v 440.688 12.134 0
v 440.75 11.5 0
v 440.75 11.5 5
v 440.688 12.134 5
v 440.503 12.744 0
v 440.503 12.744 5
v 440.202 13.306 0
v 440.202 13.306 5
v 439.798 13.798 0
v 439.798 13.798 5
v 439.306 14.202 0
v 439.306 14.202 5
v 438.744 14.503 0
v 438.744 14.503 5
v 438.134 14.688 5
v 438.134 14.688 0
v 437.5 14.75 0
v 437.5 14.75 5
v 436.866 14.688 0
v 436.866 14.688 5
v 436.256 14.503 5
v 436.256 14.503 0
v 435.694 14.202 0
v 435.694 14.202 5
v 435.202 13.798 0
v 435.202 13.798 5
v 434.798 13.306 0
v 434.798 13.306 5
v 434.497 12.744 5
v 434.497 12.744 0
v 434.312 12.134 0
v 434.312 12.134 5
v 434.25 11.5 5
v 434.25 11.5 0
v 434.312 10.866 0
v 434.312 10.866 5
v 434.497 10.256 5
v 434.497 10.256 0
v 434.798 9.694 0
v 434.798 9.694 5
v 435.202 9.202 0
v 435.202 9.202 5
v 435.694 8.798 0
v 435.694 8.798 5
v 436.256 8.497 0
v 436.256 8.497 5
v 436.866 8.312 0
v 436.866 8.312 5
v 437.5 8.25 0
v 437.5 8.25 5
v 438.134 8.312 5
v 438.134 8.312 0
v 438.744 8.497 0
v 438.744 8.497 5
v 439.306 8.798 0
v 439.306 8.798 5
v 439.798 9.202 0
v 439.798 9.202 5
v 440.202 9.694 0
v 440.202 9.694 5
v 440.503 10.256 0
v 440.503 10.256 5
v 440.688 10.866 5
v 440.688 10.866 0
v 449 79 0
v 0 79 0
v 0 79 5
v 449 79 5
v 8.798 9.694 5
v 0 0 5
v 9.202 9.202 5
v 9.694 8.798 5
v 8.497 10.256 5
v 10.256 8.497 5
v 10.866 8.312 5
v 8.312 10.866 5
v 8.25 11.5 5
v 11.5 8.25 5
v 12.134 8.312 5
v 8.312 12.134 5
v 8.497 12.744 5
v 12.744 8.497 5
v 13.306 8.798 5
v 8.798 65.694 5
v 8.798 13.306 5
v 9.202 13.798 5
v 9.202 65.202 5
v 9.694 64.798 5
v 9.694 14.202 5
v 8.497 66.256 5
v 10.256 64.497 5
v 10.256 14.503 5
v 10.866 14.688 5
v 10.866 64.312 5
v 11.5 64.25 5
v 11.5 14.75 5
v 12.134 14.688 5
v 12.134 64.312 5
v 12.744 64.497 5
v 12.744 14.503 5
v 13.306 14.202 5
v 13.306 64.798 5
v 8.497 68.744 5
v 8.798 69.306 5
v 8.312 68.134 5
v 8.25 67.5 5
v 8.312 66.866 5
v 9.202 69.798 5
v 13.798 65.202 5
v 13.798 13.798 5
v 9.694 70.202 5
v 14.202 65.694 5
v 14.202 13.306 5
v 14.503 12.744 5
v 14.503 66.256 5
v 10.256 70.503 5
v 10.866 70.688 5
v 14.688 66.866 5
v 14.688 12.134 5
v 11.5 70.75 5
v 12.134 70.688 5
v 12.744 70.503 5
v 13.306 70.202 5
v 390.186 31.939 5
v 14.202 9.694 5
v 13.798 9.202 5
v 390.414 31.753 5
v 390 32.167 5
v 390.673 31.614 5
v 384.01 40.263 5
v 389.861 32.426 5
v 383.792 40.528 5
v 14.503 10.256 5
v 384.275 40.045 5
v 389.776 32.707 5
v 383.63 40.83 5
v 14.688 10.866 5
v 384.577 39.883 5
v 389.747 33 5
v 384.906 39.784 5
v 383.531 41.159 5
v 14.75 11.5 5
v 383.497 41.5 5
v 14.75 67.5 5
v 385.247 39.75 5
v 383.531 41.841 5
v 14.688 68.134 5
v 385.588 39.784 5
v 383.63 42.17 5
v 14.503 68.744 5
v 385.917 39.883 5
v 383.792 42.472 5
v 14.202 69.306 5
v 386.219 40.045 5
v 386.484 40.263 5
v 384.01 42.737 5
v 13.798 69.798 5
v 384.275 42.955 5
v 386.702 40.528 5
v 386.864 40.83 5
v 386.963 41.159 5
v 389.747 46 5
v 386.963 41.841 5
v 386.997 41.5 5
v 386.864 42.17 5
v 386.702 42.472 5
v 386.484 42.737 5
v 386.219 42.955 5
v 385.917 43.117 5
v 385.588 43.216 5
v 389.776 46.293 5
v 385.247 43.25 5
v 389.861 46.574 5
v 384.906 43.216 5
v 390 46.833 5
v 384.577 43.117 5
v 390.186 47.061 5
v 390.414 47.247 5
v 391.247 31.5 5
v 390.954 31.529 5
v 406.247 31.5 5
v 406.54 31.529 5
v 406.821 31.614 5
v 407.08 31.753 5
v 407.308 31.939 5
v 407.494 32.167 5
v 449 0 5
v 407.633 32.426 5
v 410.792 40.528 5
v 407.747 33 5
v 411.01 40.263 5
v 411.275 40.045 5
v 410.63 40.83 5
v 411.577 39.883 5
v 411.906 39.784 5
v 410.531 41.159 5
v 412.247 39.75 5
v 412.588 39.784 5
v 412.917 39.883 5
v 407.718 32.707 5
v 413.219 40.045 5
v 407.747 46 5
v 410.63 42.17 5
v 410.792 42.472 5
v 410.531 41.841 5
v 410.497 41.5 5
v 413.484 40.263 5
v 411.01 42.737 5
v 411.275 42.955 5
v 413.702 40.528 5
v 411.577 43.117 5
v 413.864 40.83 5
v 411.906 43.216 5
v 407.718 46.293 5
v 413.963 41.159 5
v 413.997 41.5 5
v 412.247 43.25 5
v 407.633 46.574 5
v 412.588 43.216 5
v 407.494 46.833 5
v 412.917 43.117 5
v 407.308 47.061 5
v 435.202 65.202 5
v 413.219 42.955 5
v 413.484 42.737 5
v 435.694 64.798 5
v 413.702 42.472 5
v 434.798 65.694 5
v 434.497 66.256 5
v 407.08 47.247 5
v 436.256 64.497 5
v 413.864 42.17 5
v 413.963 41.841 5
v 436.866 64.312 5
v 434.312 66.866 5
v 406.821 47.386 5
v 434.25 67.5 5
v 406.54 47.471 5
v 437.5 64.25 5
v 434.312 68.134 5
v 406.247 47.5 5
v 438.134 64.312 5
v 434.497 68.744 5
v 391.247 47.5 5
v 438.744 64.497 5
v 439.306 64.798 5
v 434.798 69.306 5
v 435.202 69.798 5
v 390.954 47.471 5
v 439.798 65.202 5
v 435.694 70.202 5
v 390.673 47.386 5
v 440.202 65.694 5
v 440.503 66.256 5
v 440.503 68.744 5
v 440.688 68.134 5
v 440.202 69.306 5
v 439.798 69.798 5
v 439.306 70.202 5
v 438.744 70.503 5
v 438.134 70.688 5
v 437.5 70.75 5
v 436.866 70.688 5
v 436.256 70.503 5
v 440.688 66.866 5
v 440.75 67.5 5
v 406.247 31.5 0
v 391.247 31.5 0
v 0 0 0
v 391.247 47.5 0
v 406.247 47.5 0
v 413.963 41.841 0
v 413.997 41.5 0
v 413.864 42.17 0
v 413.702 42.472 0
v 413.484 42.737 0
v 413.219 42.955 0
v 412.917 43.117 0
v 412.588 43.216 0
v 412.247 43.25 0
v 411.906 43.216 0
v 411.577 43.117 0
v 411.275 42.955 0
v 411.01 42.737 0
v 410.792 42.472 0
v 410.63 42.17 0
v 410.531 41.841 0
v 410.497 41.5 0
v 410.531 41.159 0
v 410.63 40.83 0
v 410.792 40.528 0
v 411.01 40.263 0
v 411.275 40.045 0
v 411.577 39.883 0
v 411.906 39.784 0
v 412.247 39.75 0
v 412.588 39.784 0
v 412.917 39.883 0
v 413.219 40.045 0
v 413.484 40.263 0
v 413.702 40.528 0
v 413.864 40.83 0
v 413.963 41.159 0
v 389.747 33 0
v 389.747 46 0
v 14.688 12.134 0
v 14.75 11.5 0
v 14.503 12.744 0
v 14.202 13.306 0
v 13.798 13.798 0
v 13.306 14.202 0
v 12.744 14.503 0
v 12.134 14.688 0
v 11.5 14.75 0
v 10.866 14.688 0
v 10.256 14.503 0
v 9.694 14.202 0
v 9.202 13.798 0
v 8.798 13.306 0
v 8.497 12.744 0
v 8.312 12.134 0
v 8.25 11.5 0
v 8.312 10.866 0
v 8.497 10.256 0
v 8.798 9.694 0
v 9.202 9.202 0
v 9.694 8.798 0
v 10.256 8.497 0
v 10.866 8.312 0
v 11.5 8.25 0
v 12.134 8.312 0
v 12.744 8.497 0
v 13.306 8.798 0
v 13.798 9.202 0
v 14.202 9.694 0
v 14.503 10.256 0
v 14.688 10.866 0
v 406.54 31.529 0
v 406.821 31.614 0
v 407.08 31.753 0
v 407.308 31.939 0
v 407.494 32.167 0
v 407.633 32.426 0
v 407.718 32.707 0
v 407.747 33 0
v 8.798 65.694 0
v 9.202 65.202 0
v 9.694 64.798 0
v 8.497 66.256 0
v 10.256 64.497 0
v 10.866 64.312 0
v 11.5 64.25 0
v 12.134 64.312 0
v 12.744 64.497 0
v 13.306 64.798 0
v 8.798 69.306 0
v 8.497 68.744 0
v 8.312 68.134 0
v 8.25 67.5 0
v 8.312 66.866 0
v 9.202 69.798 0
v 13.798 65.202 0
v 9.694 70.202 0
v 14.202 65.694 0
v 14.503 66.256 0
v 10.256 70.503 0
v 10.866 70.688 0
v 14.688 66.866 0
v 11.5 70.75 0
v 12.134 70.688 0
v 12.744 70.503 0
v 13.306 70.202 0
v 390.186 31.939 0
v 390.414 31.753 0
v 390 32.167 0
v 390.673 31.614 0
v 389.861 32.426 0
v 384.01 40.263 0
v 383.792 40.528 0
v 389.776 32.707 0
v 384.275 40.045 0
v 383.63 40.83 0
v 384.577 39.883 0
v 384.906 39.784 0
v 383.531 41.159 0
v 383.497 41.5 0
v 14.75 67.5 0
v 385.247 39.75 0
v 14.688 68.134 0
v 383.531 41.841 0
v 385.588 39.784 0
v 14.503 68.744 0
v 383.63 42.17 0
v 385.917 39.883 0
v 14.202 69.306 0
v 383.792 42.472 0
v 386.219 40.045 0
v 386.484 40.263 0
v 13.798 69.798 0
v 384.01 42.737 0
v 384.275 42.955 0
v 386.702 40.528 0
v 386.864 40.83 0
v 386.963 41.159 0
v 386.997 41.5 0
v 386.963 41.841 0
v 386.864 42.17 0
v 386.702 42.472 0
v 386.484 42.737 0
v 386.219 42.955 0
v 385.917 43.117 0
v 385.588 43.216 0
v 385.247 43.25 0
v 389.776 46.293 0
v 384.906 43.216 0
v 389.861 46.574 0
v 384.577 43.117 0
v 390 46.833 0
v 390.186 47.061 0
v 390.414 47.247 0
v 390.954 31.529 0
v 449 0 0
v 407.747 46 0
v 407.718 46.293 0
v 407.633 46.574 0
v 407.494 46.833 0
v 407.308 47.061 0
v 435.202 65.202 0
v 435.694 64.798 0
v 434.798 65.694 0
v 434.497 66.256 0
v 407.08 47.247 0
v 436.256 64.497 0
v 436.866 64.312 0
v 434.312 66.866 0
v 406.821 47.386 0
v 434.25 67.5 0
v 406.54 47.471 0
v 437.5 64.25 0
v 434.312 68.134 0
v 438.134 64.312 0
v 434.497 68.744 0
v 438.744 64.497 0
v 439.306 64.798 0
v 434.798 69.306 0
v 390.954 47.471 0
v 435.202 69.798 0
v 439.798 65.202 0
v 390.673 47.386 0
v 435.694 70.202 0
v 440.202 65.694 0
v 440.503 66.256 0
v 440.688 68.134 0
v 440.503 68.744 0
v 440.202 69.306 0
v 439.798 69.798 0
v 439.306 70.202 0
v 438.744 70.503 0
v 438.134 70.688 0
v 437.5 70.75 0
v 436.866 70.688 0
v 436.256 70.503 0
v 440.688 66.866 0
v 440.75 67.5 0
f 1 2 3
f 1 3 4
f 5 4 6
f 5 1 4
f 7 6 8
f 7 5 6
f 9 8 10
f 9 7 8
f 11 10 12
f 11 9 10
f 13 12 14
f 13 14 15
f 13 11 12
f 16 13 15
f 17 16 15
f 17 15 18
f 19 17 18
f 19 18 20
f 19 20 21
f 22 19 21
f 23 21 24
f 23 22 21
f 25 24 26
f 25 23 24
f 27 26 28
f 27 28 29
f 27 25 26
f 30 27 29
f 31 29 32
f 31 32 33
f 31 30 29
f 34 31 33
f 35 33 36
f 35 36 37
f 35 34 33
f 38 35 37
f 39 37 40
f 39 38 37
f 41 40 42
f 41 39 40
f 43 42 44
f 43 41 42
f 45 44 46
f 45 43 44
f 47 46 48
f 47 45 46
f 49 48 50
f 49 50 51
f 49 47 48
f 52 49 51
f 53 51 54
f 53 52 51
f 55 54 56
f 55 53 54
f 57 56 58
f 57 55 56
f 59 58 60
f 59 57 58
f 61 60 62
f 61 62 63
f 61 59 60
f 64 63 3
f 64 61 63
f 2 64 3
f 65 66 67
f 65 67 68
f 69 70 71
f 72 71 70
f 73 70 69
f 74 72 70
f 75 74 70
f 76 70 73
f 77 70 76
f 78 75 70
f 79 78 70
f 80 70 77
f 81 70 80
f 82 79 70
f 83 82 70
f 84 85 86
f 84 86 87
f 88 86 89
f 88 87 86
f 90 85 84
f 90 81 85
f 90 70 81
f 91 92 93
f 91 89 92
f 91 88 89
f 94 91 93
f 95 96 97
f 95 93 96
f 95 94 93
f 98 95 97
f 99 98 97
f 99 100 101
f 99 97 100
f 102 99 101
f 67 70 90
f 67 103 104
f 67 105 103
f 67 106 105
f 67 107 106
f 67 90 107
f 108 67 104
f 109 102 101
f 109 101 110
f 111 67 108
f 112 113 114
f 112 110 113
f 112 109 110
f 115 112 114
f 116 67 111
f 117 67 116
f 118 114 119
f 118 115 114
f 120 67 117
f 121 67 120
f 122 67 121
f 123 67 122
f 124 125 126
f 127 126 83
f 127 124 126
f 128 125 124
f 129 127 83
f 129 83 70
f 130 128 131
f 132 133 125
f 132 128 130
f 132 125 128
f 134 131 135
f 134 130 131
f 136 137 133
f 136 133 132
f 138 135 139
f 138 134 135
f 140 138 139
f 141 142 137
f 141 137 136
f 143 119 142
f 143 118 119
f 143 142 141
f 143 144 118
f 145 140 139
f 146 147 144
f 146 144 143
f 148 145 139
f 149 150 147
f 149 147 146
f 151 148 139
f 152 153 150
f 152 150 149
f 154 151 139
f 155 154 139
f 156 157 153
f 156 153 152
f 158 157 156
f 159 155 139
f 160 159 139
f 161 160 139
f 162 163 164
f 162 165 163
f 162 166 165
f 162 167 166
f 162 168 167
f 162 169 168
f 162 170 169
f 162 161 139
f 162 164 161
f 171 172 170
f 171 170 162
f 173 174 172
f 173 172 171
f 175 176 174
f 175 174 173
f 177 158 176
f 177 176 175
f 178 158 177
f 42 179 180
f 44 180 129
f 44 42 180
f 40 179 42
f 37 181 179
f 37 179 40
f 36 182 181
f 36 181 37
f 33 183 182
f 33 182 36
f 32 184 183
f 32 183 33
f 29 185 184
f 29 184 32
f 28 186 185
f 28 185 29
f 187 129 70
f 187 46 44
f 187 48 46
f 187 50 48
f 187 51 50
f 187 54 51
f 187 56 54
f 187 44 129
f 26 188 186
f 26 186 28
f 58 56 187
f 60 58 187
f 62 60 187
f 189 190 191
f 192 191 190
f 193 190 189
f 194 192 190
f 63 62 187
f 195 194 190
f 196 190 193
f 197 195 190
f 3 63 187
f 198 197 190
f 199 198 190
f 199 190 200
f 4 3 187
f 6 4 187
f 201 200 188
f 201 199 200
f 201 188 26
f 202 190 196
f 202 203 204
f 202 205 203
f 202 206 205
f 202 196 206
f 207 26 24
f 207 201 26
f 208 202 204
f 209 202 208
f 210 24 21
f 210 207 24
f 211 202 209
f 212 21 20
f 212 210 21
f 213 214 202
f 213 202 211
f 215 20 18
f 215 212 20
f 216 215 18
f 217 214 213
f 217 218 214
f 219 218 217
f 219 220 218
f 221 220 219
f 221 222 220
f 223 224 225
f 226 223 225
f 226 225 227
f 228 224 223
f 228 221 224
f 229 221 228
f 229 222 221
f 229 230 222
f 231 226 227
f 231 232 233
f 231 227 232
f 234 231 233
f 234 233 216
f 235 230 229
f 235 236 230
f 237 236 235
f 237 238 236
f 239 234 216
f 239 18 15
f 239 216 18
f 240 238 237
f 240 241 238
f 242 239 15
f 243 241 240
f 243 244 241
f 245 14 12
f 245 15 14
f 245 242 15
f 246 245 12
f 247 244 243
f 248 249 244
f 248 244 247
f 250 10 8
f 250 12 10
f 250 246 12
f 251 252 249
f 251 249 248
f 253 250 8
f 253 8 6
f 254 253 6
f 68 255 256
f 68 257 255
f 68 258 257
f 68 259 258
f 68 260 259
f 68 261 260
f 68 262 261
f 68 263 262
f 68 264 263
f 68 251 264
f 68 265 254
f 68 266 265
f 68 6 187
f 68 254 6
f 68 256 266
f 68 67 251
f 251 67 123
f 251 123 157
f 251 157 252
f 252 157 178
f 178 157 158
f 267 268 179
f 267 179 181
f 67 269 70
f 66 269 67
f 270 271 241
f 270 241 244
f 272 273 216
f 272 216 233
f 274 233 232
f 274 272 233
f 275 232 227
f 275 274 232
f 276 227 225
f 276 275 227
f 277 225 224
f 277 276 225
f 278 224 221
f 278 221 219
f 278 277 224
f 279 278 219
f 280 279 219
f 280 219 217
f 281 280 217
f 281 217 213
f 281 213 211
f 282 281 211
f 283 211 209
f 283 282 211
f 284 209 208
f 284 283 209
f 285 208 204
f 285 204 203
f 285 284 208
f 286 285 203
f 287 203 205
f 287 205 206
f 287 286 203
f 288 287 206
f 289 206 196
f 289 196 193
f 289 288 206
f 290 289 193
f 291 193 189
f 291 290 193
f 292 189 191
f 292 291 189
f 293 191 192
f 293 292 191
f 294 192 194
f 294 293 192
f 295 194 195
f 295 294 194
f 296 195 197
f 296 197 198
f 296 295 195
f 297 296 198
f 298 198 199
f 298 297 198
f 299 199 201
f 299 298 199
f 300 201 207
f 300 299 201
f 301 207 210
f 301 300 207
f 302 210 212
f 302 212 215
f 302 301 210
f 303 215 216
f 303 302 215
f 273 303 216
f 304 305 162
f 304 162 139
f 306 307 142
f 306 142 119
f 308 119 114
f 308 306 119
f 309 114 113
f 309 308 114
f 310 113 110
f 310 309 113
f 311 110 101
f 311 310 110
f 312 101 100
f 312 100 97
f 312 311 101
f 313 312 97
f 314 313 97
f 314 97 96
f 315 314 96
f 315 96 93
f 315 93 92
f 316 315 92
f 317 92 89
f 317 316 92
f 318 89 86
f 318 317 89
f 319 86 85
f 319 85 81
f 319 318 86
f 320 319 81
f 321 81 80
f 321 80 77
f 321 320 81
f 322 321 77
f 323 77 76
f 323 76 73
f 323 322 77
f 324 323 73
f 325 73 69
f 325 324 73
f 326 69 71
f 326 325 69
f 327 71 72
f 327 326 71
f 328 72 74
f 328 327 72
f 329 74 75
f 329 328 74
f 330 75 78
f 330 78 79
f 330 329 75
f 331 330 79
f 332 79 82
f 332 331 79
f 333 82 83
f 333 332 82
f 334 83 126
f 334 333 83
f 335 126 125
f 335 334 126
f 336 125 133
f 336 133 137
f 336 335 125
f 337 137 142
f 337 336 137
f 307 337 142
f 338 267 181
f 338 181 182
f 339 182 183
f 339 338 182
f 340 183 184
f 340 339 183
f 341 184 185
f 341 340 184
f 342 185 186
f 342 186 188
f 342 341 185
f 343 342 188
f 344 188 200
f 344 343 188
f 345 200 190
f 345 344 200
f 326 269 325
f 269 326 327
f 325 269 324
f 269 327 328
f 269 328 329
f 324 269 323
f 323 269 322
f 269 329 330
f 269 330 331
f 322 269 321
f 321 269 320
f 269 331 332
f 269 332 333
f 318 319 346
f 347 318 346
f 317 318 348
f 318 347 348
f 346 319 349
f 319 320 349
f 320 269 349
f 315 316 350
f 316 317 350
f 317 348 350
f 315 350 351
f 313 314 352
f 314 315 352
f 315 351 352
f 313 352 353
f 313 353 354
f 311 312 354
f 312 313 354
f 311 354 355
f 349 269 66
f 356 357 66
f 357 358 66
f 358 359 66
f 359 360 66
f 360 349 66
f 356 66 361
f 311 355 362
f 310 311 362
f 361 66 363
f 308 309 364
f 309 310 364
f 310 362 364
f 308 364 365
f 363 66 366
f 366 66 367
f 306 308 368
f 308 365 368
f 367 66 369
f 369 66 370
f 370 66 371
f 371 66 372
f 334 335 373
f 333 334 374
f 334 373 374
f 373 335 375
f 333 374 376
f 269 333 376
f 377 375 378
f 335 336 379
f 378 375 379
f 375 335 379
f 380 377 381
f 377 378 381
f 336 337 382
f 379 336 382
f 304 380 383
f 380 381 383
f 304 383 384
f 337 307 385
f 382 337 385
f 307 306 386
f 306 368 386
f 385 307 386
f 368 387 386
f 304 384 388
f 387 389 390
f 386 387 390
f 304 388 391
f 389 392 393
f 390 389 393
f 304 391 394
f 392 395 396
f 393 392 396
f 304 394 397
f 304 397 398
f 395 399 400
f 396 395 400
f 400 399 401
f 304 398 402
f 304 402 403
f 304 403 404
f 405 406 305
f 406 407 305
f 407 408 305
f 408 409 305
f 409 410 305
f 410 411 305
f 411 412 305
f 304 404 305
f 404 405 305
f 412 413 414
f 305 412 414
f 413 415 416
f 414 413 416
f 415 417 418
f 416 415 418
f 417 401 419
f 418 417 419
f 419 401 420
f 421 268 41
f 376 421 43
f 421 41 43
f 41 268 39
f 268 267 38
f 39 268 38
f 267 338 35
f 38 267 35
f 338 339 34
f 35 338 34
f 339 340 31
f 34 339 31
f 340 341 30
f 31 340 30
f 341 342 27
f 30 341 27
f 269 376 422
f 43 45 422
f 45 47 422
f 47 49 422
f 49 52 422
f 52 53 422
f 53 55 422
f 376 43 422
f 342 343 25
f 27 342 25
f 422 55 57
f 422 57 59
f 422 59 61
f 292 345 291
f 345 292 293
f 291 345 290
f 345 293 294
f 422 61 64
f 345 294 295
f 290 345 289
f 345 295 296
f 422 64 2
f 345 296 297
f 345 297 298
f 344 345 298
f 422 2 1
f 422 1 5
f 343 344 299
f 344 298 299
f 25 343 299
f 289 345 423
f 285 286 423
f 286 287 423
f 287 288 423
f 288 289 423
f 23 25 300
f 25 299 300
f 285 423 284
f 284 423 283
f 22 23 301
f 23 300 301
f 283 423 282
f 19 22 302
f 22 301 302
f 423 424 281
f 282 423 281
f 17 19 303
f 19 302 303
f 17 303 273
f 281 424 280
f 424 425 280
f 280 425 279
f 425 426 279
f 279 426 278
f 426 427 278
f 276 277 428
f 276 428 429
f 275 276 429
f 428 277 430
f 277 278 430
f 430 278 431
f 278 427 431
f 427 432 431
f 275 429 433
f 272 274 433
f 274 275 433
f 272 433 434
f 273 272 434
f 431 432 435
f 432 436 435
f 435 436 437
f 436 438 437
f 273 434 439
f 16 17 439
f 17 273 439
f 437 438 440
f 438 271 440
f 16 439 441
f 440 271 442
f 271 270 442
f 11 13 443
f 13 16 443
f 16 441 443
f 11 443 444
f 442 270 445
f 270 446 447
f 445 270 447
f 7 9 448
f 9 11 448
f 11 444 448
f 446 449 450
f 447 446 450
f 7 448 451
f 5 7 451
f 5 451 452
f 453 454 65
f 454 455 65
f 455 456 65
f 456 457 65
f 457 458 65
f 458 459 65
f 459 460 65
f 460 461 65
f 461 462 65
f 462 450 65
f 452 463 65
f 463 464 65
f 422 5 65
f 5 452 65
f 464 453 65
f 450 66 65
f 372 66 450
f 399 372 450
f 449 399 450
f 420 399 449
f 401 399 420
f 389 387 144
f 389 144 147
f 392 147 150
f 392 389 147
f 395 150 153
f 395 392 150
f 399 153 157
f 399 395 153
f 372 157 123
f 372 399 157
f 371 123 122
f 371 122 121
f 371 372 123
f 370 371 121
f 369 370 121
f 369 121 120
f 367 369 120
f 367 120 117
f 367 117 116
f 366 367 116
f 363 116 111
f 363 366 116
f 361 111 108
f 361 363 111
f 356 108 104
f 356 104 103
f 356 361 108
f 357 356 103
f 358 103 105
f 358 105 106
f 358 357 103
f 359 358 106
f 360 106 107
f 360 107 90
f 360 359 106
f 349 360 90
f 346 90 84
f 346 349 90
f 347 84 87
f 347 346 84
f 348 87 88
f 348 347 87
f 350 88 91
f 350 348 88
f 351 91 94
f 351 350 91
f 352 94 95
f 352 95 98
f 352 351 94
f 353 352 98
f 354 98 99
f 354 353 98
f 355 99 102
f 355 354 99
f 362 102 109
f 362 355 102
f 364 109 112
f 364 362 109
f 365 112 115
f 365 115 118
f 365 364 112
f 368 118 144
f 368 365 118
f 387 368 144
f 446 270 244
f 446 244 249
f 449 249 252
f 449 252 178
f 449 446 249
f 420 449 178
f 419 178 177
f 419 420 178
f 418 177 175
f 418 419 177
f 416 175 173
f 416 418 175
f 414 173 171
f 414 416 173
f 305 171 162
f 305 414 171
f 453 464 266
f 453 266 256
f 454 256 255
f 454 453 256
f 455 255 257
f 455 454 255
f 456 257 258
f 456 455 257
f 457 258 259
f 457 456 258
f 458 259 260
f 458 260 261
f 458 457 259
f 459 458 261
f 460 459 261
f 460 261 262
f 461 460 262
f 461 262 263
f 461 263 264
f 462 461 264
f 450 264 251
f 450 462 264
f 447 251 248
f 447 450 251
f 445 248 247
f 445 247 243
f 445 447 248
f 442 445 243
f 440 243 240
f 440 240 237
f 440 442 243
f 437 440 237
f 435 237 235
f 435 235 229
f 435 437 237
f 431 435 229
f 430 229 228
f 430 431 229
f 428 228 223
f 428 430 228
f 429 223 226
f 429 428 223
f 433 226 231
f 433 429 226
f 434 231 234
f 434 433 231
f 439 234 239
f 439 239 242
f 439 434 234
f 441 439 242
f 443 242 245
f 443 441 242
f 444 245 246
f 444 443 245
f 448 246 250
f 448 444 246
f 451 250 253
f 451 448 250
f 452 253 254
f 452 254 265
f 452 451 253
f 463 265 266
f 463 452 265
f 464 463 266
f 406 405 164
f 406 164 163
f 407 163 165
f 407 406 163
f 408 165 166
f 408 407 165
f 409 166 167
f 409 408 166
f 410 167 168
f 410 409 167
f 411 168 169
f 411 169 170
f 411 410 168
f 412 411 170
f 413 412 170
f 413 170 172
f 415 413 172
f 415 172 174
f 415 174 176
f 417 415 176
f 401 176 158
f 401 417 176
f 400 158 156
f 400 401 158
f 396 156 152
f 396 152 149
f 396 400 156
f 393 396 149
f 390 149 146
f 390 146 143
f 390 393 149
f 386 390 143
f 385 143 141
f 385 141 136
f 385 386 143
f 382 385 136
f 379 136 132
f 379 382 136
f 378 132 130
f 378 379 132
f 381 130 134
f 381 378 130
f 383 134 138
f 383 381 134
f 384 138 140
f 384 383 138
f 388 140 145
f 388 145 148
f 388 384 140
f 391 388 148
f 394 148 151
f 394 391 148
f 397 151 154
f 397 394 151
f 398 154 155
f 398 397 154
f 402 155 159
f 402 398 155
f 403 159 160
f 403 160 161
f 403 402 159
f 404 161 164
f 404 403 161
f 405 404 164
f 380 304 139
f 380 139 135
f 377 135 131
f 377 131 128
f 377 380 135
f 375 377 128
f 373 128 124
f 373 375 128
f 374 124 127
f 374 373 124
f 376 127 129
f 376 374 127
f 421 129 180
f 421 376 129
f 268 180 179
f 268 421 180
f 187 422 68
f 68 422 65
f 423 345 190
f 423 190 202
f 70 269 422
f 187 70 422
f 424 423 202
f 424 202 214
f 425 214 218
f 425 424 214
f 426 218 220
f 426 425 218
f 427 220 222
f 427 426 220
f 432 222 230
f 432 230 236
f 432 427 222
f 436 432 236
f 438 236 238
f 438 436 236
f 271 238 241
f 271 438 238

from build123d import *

# Parameters (mm, degrees)
SKETCH_F_W                   = 449
SKETCH_F_H                   = 79
SKETCH_F_R                   = 3.25
SKETCH_F_R_2                 = 1.75
ESTRUSIONE_ESTRUSIONE1_DEPTH = 5


with BuildPart() as part:
    # Sketch f → Estrusione-Estrusione1 (new body)
    with BuildSketch(Plane.XY):
        with Locations((224.5, 39.5)):
            Rectangle(SKETCH_F_W, SKETCH_F_H)
        with Locations((11.5, 67.5)):
            Circle(SKETCH_F_R, mode=Mode.SUBTRACT)
        with Locations((437.5, 67.5)):
            Circle(SKETCH_F_R, mode=Mode.SUBTRACT)
        with Locations((11.5, 11.5)):
            Circle(SKETCH_F_R, mode=Mode.SUBTRACT)
        with Locations((437.5, 11.5)):
            Circle(SKETCH_F_R, mode=Mode.SUBTRACT)
        with Locations((385.246939646, 41.5)):
            Circle(SKETCH_F_R_2, mode=Mode.SUBTRACT)
        with Locations((412.246939646, 41.5)):
            Circle(SKETCH_F_R_2, mode=Mode.SUBTRACT)
        with BuildLine():
            Line((407.746939646, 33), (407.746939646, 46))
            ThreePointArc((407.746939646, 46), (407.307599818, 47.060660172), (406.246939646, 47.5))
            Line((406.246939646, 47.5), (391.246939646, 47.5))
            ThreePointArc((391.246939646, 47.5), (390.186279474, 47.060660172), (389.746939646, 46))
            Line((389.746939646, 46), (389.746939646, 33))
            ThreePointArc((389.746939646, 33), (390.186279474, 31.939339828), (391.246939646, 31.5))
            Line((391.246939646, 31.5), (406.246939646, 31.5))
            ThreePointArc((406.246939646, 31.5), (407.307599818, 31.939339828), (407.746939646, 33))
        make_face(mode=Mode.SUBTRACT)
    extrude(amount=ESTRUSIONE_ESTRUSIONE1_DEPTH)


solid = part.part
